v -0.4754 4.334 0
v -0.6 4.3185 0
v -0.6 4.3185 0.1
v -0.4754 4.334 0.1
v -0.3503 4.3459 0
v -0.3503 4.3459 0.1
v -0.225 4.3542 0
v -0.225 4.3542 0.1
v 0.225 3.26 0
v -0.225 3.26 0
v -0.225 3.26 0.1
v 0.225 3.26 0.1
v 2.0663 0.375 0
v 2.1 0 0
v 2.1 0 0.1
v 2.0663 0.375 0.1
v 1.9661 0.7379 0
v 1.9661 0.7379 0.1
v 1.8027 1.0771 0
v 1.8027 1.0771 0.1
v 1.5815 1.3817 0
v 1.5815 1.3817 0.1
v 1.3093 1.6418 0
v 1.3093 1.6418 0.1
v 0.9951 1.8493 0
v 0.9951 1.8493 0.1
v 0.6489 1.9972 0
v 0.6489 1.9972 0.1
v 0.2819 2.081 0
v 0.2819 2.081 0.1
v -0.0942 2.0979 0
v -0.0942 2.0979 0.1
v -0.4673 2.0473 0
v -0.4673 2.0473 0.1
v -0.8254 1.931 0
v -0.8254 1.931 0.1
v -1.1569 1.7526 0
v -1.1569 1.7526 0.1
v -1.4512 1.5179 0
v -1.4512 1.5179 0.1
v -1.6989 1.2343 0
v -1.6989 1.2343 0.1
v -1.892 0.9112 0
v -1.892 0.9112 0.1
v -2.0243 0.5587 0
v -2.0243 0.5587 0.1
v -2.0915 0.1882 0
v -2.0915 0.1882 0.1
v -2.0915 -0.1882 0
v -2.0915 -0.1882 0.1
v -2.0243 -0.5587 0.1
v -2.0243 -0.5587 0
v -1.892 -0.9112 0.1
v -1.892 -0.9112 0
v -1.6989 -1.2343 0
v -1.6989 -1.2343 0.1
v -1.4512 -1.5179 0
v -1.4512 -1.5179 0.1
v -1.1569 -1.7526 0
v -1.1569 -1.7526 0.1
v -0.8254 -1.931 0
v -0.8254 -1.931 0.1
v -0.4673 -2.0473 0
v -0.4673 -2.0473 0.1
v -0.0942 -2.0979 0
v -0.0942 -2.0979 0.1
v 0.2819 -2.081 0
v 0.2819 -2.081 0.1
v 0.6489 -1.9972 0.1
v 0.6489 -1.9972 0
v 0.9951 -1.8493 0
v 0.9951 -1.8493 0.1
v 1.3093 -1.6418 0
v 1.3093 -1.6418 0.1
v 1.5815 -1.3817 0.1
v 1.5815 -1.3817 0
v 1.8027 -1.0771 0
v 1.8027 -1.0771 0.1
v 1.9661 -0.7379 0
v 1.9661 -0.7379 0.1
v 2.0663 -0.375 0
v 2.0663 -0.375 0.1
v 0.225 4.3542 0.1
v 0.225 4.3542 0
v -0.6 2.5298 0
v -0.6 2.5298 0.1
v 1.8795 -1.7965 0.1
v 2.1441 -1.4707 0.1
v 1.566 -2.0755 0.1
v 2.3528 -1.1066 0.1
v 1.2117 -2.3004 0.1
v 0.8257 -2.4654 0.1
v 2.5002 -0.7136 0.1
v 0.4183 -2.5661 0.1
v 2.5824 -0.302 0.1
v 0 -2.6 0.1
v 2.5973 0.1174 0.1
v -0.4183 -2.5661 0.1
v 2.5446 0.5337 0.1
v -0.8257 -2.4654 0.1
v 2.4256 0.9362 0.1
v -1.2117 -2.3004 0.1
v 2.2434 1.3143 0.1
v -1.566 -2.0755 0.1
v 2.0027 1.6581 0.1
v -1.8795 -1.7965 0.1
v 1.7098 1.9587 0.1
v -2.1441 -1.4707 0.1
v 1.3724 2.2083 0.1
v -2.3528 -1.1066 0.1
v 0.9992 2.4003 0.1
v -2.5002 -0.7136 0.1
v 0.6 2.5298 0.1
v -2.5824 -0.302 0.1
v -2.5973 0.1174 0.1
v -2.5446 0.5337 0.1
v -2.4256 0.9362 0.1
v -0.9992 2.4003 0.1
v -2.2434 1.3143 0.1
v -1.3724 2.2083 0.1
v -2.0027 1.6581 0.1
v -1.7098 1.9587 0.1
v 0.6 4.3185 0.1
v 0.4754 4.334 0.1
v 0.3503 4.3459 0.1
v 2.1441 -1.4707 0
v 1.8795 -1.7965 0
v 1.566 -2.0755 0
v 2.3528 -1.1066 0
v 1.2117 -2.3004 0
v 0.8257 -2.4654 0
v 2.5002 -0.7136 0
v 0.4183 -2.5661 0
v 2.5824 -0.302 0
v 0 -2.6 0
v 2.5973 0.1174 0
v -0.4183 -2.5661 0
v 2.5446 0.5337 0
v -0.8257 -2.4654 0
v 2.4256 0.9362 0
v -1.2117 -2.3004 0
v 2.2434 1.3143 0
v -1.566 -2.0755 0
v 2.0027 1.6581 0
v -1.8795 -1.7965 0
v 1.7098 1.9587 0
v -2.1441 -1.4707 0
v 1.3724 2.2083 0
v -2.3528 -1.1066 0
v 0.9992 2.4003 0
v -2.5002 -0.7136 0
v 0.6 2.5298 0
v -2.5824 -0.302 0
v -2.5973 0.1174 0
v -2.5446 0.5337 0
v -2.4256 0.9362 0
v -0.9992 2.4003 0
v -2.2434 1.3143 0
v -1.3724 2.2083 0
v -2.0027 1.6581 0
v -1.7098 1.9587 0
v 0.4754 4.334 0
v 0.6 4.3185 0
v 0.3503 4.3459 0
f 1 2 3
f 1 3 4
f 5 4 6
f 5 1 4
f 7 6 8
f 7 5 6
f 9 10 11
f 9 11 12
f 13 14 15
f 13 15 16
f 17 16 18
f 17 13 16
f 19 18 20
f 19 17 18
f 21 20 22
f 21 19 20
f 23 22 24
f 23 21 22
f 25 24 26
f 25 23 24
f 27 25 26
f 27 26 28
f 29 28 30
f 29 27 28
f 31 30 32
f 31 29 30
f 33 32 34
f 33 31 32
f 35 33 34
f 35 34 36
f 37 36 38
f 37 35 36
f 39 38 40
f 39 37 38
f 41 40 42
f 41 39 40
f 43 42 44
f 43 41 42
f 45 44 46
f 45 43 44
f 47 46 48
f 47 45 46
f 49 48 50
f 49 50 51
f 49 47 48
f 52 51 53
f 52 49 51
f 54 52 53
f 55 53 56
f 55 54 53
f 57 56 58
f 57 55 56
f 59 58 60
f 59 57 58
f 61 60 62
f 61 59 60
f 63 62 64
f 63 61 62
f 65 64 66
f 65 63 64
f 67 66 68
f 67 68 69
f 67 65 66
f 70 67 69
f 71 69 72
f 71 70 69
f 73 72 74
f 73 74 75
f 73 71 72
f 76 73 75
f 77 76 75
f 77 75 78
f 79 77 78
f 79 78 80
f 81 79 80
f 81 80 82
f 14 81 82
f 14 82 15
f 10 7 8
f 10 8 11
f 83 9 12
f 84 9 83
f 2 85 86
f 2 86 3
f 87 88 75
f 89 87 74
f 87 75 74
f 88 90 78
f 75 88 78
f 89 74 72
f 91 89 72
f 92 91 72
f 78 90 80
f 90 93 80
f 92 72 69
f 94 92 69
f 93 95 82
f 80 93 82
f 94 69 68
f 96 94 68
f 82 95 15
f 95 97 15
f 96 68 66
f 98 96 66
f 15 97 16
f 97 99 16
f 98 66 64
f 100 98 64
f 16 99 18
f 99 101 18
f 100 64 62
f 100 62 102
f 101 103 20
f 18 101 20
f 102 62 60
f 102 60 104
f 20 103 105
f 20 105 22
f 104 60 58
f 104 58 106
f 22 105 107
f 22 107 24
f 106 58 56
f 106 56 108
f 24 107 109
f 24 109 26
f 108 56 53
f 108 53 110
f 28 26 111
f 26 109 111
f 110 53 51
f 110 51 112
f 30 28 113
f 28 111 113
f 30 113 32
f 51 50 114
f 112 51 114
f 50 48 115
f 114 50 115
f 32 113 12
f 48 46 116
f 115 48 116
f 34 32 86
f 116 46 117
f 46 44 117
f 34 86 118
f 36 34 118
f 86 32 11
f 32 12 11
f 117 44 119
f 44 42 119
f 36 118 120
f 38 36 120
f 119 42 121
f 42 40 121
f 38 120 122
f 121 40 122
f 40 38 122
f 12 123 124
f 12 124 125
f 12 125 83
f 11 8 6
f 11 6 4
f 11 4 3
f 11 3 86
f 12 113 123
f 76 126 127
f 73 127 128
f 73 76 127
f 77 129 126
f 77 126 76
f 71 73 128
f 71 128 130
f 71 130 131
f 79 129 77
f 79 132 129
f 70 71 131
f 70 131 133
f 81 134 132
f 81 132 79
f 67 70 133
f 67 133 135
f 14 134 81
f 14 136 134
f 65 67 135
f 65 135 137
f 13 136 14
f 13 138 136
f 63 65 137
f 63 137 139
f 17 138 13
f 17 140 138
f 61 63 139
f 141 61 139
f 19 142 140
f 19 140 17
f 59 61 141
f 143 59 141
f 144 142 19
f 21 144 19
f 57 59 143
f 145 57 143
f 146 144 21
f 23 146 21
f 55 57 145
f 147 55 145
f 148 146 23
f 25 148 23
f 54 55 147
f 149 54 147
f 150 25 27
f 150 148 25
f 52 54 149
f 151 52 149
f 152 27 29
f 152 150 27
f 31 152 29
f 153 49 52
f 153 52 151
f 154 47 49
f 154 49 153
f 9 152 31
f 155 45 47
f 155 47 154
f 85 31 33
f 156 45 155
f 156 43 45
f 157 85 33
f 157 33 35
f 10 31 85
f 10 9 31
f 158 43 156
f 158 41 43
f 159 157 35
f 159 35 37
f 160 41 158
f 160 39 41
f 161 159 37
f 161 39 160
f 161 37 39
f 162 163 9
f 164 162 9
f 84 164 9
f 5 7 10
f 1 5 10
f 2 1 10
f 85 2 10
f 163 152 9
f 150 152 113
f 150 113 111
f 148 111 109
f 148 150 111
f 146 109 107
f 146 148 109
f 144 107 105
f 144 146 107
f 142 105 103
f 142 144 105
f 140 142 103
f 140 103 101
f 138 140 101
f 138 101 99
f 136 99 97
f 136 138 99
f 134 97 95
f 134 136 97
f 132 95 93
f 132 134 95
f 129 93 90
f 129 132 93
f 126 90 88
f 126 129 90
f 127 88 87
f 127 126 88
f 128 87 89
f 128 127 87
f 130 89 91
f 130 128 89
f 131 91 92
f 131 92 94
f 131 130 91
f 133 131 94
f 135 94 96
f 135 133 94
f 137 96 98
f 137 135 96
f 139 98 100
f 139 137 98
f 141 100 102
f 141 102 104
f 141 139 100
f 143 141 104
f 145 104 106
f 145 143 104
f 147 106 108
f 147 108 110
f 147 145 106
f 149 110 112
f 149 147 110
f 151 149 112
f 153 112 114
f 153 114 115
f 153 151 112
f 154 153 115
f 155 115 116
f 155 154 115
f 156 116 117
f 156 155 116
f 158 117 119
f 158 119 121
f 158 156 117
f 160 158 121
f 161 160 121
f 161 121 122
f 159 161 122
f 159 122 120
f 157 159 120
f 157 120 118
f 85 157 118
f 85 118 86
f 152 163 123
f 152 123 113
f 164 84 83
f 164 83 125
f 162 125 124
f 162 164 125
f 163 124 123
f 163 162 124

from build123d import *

# Parameters (mm, degrees)
SKETCH1_R           = 2.1
BOSS_EXTRUDE1_DEPTH = 0.1


with BuildPart() as part:
    # Sketch1 → Boss-Extrude1 (new body)
    with BuildSketch(Plane.XY):
        with BuildLine():
            Line((-0.6, 2.529822128), (-0.6, 4.318518264))
            ThreePointArc((-0.6, 4.318518264), (-0.412885429, 4.340406159), (-0.225, 4.35419051))
            Line((-0.225, 4.35419051), (-0.225, 3.26))
            Line((-0.225, 3.26), (0.225, 3.26))
            Line((0.225, 3.26), (0.225, 4.35419051))
            ThreePointArc((0.225, 4.35419051), (0.412885429, 4.340406159), (0.6, 4.318518264))
            Line((0.6, 4.318518264), (0.6, 2.529822128))
            ThreePointArc((0.6, 2.529822128), (0, -2.6), (-0.6, 2.529822128))
        make_face()
        Circle(SKETCH1_R, mode=Mode.SUBTRACT)
    extrude(amount=BOSS_EXTRUDE1_DEPTH)


solid = part.part
